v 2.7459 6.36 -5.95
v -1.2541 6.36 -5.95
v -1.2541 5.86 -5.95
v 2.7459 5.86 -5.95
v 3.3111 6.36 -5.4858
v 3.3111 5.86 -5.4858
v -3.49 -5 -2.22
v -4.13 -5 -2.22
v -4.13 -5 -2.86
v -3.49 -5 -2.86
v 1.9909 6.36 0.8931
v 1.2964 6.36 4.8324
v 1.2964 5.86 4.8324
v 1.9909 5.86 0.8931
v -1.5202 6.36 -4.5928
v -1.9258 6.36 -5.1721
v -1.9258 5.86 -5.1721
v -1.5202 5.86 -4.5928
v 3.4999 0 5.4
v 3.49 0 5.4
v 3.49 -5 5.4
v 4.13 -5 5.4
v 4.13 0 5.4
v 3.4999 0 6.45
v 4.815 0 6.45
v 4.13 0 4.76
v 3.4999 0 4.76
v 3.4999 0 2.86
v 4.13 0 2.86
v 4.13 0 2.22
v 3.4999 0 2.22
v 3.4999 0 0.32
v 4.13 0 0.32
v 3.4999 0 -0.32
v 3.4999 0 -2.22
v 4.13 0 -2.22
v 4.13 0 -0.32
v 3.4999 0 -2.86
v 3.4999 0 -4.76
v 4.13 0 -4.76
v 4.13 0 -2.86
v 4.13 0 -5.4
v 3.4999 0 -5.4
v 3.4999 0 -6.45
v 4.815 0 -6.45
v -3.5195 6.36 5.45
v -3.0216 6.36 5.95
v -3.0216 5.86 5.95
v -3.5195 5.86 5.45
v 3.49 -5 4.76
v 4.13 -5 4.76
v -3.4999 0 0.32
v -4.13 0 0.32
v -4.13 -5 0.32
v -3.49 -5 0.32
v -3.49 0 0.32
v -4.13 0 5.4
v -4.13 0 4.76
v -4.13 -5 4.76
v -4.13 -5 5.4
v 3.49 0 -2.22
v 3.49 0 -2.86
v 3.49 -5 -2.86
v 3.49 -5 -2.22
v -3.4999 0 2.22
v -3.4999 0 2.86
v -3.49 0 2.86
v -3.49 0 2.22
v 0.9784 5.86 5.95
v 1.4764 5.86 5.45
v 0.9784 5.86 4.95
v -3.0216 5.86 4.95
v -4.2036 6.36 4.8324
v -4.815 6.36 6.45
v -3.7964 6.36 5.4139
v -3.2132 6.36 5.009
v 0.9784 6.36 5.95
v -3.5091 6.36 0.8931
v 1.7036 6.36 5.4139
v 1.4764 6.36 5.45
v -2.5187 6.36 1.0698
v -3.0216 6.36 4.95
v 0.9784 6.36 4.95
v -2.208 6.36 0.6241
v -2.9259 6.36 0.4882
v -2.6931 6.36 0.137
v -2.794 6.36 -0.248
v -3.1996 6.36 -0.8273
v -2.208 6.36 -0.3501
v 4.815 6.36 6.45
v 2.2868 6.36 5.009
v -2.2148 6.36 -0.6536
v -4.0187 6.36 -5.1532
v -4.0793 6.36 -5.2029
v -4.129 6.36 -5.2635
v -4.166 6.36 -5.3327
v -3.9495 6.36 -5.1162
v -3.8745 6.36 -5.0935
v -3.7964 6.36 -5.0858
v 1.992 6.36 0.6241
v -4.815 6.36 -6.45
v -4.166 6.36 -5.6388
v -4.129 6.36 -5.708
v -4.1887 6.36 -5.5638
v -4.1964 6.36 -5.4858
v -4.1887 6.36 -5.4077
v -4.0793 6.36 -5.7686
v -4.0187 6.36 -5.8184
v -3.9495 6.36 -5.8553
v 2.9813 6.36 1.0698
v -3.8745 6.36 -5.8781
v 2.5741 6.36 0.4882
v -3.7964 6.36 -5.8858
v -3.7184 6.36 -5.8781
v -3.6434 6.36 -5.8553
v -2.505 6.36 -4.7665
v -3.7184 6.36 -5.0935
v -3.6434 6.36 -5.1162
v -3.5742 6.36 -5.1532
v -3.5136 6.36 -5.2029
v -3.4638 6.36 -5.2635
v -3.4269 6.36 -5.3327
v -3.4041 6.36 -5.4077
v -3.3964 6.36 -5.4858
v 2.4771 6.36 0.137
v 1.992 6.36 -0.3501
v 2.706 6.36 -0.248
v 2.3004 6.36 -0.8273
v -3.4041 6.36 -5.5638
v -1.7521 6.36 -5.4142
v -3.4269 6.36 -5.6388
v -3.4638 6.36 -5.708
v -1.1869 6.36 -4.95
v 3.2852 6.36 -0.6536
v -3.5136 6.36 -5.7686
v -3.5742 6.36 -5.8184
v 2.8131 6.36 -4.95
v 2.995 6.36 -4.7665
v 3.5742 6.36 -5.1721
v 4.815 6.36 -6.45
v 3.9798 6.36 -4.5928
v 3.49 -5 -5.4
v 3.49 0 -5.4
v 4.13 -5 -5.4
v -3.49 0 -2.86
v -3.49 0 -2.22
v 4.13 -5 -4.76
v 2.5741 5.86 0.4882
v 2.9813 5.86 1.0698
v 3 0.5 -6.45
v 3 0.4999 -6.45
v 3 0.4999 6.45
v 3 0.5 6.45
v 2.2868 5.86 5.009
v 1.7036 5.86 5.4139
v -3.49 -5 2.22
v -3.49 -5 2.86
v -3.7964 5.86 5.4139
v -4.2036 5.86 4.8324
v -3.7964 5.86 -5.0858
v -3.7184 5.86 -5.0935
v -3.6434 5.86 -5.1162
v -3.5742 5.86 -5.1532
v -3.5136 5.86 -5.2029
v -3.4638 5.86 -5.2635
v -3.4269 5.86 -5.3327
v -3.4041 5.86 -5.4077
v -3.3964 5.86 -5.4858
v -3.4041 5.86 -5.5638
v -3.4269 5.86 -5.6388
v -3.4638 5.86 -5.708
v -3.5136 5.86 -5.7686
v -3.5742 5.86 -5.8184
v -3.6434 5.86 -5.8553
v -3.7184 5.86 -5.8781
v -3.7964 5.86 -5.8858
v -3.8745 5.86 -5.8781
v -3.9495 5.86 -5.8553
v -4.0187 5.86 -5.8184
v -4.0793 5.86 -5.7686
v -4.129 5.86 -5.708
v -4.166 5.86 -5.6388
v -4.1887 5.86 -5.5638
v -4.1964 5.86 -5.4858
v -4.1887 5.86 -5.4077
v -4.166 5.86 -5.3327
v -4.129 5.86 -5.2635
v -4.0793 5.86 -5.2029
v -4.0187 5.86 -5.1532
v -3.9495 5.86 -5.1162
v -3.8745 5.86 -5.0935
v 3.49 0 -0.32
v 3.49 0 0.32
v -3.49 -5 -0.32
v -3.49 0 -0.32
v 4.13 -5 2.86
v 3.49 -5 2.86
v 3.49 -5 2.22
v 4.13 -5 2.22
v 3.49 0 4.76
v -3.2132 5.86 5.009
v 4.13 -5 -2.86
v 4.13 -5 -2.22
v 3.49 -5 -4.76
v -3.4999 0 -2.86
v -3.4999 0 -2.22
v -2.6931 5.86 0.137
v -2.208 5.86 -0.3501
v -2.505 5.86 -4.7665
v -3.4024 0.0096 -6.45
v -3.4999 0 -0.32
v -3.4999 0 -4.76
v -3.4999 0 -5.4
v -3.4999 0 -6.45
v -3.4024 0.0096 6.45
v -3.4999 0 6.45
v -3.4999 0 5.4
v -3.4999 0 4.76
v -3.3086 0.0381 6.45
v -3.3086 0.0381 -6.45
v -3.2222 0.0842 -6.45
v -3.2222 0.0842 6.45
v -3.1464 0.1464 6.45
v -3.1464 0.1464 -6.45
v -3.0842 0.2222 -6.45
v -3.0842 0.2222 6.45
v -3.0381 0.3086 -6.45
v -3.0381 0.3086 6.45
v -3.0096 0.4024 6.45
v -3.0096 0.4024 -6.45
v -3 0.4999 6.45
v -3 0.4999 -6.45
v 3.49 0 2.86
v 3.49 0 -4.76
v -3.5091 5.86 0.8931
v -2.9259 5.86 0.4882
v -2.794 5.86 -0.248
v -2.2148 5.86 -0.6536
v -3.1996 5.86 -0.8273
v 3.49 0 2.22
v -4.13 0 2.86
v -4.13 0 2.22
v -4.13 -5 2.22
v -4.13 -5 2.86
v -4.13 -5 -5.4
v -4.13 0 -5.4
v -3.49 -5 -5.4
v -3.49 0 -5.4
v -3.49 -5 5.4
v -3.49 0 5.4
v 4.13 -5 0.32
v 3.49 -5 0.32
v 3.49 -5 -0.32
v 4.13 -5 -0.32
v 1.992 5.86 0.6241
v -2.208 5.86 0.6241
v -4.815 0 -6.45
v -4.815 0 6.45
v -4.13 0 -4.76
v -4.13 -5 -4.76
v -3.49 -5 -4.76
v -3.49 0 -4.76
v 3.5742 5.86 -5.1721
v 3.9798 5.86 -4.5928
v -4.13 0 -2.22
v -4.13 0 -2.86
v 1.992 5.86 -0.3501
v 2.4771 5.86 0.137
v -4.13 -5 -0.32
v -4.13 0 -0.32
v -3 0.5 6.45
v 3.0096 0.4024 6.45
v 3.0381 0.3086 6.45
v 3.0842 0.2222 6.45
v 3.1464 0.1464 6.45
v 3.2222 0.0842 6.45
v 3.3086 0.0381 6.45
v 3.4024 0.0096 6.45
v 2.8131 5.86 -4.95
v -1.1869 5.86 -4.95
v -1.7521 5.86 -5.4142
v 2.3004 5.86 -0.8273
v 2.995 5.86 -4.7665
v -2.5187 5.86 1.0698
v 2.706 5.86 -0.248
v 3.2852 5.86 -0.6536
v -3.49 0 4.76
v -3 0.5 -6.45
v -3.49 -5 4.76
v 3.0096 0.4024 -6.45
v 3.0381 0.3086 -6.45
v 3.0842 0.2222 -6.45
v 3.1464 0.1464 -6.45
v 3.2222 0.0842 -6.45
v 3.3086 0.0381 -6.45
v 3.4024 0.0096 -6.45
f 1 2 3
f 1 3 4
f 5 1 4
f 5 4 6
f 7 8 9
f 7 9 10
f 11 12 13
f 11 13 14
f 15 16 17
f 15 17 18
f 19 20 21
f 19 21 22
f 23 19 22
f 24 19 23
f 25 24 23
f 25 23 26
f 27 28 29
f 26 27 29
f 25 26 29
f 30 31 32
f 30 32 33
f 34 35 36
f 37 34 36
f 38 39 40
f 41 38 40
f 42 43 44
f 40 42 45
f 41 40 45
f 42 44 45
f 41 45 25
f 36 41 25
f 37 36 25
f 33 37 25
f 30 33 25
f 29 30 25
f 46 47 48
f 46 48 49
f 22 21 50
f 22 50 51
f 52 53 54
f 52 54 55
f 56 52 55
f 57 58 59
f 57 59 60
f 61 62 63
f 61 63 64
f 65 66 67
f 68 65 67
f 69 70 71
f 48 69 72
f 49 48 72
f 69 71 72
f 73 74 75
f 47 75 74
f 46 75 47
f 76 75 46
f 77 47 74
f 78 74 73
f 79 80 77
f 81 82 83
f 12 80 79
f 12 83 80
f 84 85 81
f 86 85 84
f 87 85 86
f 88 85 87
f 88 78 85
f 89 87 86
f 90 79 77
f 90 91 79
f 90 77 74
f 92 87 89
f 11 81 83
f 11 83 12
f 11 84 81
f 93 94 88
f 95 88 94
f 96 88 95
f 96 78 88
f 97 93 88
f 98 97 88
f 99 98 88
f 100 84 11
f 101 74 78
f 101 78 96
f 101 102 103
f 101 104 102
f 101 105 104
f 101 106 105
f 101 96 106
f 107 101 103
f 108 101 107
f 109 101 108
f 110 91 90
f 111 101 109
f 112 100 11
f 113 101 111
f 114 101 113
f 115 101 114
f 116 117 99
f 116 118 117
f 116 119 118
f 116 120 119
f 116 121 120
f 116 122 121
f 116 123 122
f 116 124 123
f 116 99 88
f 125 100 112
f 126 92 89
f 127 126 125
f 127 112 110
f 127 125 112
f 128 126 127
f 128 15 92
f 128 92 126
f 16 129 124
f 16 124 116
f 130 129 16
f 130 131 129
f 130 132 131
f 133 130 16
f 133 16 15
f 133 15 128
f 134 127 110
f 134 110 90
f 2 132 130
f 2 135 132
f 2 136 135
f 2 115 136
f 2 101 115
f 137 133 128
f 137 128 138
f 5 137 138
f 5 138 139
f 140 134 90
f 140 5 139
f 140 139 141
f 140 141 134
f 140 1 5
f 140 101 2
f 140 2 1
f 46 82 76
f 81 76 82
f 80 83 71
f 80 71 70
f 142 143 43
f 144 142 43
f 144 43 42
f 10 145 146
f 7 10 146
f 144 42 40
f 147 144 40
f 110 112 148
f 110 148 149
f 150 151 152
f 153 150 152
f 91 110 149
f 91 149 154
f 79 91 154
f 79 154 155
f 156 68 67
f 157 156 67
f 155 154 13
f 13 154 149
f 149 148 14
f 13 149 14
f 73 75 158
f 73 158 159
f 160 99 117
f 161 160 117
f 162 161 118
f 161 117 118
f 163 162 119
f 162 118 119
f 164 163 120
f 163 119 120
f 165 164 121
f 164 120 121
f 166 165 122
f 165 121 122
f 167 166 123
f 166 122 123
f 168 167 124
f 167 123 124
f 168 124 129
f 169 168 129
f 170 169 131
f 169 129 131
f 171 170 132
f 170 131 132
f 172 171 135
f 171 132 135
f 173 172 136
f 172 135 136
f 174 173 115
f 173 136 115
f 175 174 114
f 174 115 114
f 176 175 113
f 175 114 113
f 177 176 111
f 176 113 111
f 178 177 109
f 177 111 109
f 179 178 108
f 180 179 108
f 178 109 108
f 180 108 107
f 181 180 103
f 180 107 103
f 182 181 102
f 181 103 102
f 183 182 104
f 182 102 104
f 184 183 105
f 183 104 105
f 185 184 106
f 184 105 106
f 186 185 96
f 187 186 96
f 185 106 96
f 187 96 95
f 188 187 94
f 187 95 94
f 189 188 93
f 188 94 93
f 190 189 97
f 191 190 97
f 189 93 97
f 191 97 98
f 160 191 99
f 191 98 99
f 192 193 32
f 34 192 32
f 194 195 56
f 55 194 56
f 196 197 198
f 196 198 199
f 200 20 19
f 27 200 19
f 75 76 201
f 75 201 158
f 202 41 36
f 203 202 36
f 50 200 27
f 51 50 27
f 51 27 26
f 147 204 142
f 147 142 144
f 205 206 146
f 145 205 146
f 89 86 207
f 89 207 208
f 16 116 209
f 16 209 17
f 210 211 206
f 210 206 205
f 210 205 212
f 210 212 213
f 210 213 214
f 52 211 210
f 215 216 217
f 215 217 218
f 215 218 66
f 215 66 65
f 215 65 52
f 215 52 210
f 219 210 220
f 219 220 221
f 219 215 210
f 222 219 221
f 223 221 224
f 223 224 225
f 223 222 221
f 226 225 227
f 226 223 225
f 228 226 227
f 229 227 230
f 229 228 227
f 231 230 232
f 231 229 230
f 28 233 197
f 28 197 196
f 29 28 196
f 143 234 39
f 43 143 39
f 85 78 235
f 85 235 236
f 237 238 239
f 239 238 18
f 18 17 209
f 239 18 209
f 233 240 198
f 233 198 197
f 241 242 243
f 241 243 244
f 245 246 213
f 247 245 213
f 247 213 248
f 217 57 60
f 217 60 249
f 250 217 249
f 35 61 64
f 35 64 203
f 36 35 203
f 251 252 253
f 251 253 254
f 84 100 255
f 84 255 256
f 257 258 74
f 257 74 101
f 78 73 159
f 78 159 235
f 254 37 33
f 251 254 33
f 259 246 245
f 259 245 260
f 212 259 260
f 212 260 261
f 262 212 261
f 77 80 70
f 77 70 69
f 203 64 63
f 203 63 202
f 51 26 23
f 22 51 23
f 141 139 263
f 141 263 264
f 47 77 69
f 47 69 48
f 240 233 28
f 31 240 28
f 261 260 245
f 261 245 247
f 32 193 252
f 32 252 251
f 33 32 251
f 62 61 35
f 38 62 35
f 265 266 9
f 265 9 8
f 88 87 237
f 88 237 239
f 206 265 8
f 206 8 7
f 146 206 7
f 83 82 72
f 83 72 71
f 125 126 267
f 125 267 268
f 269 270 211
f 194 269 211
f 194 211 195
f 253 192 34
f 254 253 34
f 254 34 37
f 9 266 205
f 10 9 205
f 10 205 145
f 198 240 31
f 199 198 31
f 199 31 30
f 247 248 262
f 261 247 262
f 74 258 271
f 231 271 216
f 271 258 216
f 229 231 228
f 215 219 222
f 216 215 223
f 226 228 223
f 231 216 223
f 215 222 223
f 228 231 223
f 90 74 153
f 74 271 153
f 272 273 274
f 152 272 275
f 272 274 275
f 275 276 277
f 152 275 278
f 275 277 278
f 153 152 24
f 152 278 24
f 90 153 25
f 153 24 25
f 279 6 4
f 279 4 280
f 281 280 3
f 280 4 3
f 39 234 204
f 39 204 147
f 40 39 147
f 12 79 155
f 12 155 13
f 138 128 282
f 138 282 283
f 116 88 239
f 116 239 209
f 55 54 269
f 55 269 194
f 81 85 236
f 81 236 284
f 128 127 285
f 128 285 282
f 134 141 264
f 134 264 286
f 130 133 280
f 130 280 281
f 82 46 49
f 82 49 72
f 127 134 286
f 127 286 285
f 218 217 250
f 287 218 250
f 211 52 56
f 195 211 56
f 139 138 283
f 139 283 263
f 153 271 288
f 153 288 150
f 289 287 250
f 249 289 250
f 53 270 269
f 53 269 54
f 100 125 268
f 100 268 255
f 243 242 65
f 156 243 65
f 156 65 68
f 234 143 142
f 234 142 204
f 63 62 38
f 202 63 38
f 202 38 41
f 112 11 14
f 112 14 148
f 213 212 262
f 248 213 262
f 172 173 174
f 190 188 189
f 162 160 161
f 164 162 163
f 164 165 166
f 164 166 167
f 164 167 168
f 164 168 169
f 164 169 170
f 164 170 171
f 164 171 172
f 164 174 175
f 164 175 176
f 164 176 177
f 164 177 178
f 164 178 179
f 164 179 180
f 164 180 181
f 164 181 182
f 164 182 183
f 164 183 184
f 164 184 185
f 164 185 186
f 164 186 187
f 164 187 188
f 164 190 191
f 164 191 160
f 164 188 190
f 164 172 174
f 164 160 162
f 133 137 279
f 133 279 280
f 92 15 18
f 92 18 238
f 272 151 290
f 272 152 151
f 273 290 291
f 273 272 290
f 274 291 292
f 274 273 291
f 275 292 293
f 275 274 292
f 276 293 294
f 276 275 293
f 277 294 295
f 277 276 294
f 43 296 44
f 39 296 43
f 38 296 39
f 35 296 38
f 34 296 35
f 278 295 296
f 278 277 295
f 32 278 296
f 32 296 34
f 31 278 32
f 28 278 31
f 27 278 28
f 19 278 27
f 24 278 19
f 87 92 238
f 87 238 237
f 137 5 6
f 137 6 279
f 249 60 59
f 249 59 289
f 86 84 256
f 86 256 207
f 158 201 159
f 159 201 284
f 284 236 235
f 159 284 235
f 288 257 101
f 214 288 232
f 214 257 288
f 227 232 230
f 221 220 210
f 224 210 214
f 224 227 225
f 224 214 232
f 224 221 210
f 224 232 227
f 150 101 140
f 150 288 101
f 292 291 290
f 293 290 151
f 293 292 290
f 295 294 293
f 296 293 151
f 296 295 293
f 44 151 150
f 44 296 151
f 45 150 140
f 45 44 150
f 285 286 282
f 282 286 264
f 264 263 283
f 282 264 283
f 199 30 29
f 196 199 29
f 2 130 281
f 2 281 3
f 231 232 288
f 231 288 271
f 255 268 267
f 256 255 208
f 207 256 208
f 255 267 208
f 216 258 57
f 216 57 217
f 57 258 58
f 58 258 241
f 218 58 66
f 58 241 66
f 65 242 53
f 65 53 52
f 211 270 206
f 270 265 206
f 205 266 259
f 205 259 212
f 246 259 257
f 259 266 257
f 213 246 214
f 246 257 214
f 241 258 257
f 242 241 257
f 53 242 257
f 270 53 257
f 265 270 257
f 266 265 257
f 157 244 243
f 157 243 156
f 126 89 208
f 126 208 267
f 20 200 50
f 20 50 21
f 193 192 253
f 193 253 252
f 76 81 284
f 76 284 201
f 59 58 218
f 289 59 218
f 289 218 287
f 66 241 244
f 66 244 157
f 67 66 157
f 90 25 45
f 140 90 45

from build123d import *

# Parameters (mm, degrees)
SKETCH1_W           = 9.63
SKETCH1_H           = 12.9
BOSS_EXTRUDE1_DEPTH = 6.36
SKETCH2_W           = 6
SKETCH2_H           = 12.9
CUT_EXTRUDE1_DEPTH  = 0.5
FILLET1_R           = 0.5
SKETCH3_W           = 0.64
SKETCH3_H           = 0.64
BOSS_EXTRUDE2_DEPTH = 5
SKETCH4_R           = 0.4
CUT_EXTRUDE2_DEPTH  = 0.5


with BuildPart() as part:
    # Sketch1 → Boss-Extrude1 (new body)
    with BuildSketch(Plane(origin=(0, 0, 0), x_dir=(1, 0, 0), z_dir=(0, 1, 0))):
        Rectangle(SKETCH1_W, SKETCH1_H)
    extrude(amount=BOSS_EXTRUDE1_DEPTH)

    # Sketch2 → Cut-Extrude1 (cut)
    with BuildSketch(Plane.XZ):
        Rectangle(SKETCH2_W, SKETCH2_H)
    extrude(amount=-CUT_EXTRUDE1_DEPTH, mode=Mode.SUBTRACT)

    # Fillet1
    fillet1_edges = [part.edges().sort_by_distance(p)[0] for p in [
        (3, 0, 0),
        (-3, 0, 0),
    ]]
    fillet(fillet1_edges, radius=FILLET1_R - 0.0001)  # a hair under: the kernel refuses the full size

    # Sketch3 → Boss-Extrude2 (add)
    with BuildSketch(Plane.XZ):
        with Locations((-3.81, 2.54)):
            Rectangle(SKETCH3_W, SKETCH3_H)
        with Locations((-3.81, 5.08)):
            Rectangle(SKETCH3_W, SKETCH3_H)
        with Locations((-3.81, 0)):
            Rectangle(SKETCH3_W, SKETCH3_H)
        with Locations((-3.81, -2.54)):
            Rectangle(SKETCH3_W, SKETCH3_H)
        with Locations((-3.81, -5.08)):
            Rectangle(SKETCH3_W, SKETCH3_H)
        with Locations((3.81, 2.54)):
            Rectangle(SKETCH3_W, SKETCH3_H)
        with Locations((3.81, 5.08)):
            Rectangle(SKETCH3_W, SKETCH3_H)
        with Locations((3.81, 0)):
            Rectangle(SKETCH3_W, SKETCH3_H)
        with Locations((3.81, -2.54)):
            Rectangle(SKETCH3_W, SKETCH3_H)
        with Locations((3.81, -5.08)):
            Rectangle(SKETCH3_W, SKETCH3_H)
    extrude(amount=BOSS_EXTRUDE2_DEPTH)

    # Sketch4 → Cut-Extrude2 (cut)
    with BuildSketch(Plane(origin=(0, 6.36, 0), x_dir=(1, 0, 0), z_dir=(0, 1, 0))):
        with Locations(Location((-3.796432961, 5.485774113, 0), (0, 0, 270))):
            Circle(SKETCH4_R)
        Polygon((3.97982075, 4.592848347), (3.28522804, 0.653617335), (2.706000074, 0.248037547), (2.300420287, 0.827265513), (2.995012997, 4.766496525), (3.574240963, 5.172076312), align=None)
        Polygon((2.981343729, -1.069796233), (2.286751018, -5.009027245), (1.703567039, -5.41390948), (1.296354761, -4.832350077), (1.990947472, -0.893119065), (2.574131451, -0.48823683), align=None)
        Polygon((-3.021593907, -4.95), (0.978406093, -4.95), (1.476350329, -5.45), (0.978406093, -5.95), (-3.021593907, -5.95), (-3.519538144, -5.45), align=None)
        Polygon((-2.208030846, 0.350112276), (1.991969154, 0.350112276), (2.477076686, -0.136998017), (1.991969154, -0.62410831), (-2.208030846, -0.62410831), (-2.693138379, -0.136998017), align=None)
        Polygon((-1.254148002, 5.95), (2.745851998, 5.95), (3.31109238, 5.485774113), (2.813148144, 4.95), (-1.186851856, 4.95), (-1.752092238, 5.414225887), align=None)
        Polygon((-2.518656271, -1.069796233), (-3.213248982, -5.009027245), (-3.796432961, -5.41390948), (-4.203645239, -4.832350077), (-3.509052528, -0.893119065), (-2.925868549, -0.48823683), align=None)
        Polygon((-1.925759037, 5.172076312), (-1.52017925, 4.592848347), (-2.21477196, 0.653617335), (-2.793999926, 0.248037547), (-3.199579713, 0.827265513), (-2.504987003, 4.766496525), align=None)
    extrude(amount=-CUT_EXTRUDE2_DEPTH, mode=Mode.SUBTRACT)


solid = part.part
